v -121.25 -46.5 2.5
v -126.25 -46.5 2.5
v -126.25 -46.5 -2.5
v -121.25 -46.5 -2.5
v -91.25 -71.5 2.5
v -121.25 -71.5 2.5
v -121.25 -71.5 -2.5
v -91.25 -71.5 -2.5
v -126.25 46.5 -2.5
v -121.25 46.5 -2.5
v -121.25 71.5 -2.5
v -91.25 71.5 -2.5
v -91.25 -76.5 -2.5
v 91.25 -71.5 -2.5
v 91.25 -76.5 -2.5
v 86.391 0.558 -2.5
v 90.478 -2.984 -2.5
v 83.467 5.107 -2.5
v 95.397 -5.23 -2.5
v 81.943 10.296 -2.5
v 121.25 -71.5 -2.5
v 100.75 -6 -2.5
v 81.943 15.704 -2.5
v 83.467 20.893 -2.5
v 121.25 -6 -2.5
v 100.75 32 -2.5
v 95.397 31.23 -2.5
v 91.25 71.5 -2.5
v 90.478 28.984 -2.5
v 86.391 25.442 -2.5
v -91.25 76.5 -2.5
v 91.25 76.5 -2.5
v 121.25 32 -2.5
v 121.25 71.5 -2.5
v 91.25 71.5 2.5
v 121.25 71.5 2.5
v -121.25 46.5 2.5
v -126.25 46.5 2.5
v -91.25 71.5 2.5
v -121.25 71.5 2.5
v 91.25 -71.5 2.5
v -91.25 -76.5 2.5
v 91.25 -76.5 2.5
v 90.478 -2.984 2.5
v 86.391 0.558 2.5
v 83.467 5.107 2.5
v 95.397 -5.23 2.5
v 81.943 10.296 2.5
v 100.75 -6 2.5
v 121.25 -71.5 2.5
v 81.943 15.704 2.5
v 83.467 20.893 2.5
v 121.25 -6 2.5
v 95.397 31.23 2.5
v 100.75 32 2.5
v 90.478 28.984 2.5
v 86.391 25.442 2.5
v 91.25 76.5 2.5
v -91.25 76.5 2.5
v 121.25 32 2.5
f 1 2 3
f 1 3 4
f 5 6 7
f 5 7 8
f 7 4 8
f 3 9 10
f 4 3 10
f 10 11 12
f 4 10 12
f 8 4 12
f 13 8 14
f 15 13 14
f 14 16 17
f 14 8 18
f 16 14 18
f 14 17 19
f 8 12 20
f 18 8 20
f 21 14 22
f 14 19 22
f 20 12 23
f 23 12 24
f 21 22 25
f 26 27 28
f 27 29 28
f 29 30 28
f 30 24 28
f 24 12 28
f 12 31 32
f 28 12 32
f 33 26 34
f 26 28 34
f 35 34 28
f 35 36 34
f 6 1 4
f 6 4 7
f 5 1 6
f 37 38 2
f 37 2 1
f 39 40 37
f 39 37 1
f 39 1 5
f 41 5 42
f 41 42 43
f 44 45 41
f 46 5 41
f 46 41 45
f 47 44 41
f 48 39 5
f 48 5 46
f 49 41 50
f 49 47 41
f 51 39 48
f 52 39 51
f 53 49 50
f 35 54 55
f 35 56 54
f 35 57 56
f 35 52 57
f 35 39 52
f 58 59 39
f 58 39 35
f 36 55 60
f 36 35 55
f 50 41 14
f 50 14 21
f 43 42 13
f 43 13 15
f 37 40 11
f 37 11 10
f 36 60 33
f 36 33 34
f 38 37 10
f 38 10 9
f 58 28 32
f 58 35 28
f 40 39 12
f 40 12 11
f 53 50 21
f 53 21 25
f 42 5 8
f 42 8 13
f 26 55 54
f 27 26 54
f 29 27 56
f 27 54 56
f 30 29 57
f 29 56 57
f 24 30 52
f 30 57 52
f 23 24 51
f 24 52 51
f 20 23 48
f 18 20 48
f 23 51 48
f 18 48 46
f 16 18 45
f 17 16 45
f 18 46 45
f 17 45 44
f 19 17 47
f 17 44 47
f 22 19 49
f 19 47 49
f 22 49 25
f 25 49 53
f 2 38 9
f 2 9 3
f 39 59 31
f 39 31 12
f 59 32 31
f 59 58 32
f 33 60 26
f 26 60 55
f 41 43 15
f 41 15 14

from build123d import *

# Parameters (mm, degrees)
PAD_DEPTH = 2.5


with BuildPart() as part:
    # Sketch → Pad (new body, symmetric)
    with BuildSketch(Plane.XY):
        with BuildLine():
            Line((91.25, 76.5), (-91.25, 76.5))
            Line((-91.25, 76.5), (-91.25, 71.5))
            Line((-91.25, 71.5), (-121.25, 71.5))
            Line((-121.25, 71.5), (-121.25, 46.5))
            Line((-121.25, 46.5), (-126.25, 46.5))
            Line((-126.25, 46.5), (-126.25, -46.5))
            Line((-126.25, -46.5), (-121.25, -46.5))
            Line((-121.25, -46.5), (-121.25, -71.5))
            Line((-121.25, -71.5), (-91.25, -71.5))
            Line((-91.25, -71.5), (-91.25, -76.5))
            Line((-91.25, -76.5), (91.25, -76.5))
            Line((91.25, -76.5), (91.25, -71.5))
            Line((91.25, -71.5), (121.25, -71.5))
            Line((121.25, -71.5), (121.25, -6))
            Line((100.75, -6), (121.25, -6))
            ThreePointArc((100.75, 32), (81.75, 13), (100.75, -6))
            Line((121.25, 32), (100.75, 32))
            Line((121.25, 32), (121.25, 71.5))
            Line((121.25, 71.5), (91.25, 71.5))
            Line((91.25, 71.5), (91.25, 76.5))
        make_face()
    extrude(amount=PAD_DEPTH, both=True)


solid = part.part
